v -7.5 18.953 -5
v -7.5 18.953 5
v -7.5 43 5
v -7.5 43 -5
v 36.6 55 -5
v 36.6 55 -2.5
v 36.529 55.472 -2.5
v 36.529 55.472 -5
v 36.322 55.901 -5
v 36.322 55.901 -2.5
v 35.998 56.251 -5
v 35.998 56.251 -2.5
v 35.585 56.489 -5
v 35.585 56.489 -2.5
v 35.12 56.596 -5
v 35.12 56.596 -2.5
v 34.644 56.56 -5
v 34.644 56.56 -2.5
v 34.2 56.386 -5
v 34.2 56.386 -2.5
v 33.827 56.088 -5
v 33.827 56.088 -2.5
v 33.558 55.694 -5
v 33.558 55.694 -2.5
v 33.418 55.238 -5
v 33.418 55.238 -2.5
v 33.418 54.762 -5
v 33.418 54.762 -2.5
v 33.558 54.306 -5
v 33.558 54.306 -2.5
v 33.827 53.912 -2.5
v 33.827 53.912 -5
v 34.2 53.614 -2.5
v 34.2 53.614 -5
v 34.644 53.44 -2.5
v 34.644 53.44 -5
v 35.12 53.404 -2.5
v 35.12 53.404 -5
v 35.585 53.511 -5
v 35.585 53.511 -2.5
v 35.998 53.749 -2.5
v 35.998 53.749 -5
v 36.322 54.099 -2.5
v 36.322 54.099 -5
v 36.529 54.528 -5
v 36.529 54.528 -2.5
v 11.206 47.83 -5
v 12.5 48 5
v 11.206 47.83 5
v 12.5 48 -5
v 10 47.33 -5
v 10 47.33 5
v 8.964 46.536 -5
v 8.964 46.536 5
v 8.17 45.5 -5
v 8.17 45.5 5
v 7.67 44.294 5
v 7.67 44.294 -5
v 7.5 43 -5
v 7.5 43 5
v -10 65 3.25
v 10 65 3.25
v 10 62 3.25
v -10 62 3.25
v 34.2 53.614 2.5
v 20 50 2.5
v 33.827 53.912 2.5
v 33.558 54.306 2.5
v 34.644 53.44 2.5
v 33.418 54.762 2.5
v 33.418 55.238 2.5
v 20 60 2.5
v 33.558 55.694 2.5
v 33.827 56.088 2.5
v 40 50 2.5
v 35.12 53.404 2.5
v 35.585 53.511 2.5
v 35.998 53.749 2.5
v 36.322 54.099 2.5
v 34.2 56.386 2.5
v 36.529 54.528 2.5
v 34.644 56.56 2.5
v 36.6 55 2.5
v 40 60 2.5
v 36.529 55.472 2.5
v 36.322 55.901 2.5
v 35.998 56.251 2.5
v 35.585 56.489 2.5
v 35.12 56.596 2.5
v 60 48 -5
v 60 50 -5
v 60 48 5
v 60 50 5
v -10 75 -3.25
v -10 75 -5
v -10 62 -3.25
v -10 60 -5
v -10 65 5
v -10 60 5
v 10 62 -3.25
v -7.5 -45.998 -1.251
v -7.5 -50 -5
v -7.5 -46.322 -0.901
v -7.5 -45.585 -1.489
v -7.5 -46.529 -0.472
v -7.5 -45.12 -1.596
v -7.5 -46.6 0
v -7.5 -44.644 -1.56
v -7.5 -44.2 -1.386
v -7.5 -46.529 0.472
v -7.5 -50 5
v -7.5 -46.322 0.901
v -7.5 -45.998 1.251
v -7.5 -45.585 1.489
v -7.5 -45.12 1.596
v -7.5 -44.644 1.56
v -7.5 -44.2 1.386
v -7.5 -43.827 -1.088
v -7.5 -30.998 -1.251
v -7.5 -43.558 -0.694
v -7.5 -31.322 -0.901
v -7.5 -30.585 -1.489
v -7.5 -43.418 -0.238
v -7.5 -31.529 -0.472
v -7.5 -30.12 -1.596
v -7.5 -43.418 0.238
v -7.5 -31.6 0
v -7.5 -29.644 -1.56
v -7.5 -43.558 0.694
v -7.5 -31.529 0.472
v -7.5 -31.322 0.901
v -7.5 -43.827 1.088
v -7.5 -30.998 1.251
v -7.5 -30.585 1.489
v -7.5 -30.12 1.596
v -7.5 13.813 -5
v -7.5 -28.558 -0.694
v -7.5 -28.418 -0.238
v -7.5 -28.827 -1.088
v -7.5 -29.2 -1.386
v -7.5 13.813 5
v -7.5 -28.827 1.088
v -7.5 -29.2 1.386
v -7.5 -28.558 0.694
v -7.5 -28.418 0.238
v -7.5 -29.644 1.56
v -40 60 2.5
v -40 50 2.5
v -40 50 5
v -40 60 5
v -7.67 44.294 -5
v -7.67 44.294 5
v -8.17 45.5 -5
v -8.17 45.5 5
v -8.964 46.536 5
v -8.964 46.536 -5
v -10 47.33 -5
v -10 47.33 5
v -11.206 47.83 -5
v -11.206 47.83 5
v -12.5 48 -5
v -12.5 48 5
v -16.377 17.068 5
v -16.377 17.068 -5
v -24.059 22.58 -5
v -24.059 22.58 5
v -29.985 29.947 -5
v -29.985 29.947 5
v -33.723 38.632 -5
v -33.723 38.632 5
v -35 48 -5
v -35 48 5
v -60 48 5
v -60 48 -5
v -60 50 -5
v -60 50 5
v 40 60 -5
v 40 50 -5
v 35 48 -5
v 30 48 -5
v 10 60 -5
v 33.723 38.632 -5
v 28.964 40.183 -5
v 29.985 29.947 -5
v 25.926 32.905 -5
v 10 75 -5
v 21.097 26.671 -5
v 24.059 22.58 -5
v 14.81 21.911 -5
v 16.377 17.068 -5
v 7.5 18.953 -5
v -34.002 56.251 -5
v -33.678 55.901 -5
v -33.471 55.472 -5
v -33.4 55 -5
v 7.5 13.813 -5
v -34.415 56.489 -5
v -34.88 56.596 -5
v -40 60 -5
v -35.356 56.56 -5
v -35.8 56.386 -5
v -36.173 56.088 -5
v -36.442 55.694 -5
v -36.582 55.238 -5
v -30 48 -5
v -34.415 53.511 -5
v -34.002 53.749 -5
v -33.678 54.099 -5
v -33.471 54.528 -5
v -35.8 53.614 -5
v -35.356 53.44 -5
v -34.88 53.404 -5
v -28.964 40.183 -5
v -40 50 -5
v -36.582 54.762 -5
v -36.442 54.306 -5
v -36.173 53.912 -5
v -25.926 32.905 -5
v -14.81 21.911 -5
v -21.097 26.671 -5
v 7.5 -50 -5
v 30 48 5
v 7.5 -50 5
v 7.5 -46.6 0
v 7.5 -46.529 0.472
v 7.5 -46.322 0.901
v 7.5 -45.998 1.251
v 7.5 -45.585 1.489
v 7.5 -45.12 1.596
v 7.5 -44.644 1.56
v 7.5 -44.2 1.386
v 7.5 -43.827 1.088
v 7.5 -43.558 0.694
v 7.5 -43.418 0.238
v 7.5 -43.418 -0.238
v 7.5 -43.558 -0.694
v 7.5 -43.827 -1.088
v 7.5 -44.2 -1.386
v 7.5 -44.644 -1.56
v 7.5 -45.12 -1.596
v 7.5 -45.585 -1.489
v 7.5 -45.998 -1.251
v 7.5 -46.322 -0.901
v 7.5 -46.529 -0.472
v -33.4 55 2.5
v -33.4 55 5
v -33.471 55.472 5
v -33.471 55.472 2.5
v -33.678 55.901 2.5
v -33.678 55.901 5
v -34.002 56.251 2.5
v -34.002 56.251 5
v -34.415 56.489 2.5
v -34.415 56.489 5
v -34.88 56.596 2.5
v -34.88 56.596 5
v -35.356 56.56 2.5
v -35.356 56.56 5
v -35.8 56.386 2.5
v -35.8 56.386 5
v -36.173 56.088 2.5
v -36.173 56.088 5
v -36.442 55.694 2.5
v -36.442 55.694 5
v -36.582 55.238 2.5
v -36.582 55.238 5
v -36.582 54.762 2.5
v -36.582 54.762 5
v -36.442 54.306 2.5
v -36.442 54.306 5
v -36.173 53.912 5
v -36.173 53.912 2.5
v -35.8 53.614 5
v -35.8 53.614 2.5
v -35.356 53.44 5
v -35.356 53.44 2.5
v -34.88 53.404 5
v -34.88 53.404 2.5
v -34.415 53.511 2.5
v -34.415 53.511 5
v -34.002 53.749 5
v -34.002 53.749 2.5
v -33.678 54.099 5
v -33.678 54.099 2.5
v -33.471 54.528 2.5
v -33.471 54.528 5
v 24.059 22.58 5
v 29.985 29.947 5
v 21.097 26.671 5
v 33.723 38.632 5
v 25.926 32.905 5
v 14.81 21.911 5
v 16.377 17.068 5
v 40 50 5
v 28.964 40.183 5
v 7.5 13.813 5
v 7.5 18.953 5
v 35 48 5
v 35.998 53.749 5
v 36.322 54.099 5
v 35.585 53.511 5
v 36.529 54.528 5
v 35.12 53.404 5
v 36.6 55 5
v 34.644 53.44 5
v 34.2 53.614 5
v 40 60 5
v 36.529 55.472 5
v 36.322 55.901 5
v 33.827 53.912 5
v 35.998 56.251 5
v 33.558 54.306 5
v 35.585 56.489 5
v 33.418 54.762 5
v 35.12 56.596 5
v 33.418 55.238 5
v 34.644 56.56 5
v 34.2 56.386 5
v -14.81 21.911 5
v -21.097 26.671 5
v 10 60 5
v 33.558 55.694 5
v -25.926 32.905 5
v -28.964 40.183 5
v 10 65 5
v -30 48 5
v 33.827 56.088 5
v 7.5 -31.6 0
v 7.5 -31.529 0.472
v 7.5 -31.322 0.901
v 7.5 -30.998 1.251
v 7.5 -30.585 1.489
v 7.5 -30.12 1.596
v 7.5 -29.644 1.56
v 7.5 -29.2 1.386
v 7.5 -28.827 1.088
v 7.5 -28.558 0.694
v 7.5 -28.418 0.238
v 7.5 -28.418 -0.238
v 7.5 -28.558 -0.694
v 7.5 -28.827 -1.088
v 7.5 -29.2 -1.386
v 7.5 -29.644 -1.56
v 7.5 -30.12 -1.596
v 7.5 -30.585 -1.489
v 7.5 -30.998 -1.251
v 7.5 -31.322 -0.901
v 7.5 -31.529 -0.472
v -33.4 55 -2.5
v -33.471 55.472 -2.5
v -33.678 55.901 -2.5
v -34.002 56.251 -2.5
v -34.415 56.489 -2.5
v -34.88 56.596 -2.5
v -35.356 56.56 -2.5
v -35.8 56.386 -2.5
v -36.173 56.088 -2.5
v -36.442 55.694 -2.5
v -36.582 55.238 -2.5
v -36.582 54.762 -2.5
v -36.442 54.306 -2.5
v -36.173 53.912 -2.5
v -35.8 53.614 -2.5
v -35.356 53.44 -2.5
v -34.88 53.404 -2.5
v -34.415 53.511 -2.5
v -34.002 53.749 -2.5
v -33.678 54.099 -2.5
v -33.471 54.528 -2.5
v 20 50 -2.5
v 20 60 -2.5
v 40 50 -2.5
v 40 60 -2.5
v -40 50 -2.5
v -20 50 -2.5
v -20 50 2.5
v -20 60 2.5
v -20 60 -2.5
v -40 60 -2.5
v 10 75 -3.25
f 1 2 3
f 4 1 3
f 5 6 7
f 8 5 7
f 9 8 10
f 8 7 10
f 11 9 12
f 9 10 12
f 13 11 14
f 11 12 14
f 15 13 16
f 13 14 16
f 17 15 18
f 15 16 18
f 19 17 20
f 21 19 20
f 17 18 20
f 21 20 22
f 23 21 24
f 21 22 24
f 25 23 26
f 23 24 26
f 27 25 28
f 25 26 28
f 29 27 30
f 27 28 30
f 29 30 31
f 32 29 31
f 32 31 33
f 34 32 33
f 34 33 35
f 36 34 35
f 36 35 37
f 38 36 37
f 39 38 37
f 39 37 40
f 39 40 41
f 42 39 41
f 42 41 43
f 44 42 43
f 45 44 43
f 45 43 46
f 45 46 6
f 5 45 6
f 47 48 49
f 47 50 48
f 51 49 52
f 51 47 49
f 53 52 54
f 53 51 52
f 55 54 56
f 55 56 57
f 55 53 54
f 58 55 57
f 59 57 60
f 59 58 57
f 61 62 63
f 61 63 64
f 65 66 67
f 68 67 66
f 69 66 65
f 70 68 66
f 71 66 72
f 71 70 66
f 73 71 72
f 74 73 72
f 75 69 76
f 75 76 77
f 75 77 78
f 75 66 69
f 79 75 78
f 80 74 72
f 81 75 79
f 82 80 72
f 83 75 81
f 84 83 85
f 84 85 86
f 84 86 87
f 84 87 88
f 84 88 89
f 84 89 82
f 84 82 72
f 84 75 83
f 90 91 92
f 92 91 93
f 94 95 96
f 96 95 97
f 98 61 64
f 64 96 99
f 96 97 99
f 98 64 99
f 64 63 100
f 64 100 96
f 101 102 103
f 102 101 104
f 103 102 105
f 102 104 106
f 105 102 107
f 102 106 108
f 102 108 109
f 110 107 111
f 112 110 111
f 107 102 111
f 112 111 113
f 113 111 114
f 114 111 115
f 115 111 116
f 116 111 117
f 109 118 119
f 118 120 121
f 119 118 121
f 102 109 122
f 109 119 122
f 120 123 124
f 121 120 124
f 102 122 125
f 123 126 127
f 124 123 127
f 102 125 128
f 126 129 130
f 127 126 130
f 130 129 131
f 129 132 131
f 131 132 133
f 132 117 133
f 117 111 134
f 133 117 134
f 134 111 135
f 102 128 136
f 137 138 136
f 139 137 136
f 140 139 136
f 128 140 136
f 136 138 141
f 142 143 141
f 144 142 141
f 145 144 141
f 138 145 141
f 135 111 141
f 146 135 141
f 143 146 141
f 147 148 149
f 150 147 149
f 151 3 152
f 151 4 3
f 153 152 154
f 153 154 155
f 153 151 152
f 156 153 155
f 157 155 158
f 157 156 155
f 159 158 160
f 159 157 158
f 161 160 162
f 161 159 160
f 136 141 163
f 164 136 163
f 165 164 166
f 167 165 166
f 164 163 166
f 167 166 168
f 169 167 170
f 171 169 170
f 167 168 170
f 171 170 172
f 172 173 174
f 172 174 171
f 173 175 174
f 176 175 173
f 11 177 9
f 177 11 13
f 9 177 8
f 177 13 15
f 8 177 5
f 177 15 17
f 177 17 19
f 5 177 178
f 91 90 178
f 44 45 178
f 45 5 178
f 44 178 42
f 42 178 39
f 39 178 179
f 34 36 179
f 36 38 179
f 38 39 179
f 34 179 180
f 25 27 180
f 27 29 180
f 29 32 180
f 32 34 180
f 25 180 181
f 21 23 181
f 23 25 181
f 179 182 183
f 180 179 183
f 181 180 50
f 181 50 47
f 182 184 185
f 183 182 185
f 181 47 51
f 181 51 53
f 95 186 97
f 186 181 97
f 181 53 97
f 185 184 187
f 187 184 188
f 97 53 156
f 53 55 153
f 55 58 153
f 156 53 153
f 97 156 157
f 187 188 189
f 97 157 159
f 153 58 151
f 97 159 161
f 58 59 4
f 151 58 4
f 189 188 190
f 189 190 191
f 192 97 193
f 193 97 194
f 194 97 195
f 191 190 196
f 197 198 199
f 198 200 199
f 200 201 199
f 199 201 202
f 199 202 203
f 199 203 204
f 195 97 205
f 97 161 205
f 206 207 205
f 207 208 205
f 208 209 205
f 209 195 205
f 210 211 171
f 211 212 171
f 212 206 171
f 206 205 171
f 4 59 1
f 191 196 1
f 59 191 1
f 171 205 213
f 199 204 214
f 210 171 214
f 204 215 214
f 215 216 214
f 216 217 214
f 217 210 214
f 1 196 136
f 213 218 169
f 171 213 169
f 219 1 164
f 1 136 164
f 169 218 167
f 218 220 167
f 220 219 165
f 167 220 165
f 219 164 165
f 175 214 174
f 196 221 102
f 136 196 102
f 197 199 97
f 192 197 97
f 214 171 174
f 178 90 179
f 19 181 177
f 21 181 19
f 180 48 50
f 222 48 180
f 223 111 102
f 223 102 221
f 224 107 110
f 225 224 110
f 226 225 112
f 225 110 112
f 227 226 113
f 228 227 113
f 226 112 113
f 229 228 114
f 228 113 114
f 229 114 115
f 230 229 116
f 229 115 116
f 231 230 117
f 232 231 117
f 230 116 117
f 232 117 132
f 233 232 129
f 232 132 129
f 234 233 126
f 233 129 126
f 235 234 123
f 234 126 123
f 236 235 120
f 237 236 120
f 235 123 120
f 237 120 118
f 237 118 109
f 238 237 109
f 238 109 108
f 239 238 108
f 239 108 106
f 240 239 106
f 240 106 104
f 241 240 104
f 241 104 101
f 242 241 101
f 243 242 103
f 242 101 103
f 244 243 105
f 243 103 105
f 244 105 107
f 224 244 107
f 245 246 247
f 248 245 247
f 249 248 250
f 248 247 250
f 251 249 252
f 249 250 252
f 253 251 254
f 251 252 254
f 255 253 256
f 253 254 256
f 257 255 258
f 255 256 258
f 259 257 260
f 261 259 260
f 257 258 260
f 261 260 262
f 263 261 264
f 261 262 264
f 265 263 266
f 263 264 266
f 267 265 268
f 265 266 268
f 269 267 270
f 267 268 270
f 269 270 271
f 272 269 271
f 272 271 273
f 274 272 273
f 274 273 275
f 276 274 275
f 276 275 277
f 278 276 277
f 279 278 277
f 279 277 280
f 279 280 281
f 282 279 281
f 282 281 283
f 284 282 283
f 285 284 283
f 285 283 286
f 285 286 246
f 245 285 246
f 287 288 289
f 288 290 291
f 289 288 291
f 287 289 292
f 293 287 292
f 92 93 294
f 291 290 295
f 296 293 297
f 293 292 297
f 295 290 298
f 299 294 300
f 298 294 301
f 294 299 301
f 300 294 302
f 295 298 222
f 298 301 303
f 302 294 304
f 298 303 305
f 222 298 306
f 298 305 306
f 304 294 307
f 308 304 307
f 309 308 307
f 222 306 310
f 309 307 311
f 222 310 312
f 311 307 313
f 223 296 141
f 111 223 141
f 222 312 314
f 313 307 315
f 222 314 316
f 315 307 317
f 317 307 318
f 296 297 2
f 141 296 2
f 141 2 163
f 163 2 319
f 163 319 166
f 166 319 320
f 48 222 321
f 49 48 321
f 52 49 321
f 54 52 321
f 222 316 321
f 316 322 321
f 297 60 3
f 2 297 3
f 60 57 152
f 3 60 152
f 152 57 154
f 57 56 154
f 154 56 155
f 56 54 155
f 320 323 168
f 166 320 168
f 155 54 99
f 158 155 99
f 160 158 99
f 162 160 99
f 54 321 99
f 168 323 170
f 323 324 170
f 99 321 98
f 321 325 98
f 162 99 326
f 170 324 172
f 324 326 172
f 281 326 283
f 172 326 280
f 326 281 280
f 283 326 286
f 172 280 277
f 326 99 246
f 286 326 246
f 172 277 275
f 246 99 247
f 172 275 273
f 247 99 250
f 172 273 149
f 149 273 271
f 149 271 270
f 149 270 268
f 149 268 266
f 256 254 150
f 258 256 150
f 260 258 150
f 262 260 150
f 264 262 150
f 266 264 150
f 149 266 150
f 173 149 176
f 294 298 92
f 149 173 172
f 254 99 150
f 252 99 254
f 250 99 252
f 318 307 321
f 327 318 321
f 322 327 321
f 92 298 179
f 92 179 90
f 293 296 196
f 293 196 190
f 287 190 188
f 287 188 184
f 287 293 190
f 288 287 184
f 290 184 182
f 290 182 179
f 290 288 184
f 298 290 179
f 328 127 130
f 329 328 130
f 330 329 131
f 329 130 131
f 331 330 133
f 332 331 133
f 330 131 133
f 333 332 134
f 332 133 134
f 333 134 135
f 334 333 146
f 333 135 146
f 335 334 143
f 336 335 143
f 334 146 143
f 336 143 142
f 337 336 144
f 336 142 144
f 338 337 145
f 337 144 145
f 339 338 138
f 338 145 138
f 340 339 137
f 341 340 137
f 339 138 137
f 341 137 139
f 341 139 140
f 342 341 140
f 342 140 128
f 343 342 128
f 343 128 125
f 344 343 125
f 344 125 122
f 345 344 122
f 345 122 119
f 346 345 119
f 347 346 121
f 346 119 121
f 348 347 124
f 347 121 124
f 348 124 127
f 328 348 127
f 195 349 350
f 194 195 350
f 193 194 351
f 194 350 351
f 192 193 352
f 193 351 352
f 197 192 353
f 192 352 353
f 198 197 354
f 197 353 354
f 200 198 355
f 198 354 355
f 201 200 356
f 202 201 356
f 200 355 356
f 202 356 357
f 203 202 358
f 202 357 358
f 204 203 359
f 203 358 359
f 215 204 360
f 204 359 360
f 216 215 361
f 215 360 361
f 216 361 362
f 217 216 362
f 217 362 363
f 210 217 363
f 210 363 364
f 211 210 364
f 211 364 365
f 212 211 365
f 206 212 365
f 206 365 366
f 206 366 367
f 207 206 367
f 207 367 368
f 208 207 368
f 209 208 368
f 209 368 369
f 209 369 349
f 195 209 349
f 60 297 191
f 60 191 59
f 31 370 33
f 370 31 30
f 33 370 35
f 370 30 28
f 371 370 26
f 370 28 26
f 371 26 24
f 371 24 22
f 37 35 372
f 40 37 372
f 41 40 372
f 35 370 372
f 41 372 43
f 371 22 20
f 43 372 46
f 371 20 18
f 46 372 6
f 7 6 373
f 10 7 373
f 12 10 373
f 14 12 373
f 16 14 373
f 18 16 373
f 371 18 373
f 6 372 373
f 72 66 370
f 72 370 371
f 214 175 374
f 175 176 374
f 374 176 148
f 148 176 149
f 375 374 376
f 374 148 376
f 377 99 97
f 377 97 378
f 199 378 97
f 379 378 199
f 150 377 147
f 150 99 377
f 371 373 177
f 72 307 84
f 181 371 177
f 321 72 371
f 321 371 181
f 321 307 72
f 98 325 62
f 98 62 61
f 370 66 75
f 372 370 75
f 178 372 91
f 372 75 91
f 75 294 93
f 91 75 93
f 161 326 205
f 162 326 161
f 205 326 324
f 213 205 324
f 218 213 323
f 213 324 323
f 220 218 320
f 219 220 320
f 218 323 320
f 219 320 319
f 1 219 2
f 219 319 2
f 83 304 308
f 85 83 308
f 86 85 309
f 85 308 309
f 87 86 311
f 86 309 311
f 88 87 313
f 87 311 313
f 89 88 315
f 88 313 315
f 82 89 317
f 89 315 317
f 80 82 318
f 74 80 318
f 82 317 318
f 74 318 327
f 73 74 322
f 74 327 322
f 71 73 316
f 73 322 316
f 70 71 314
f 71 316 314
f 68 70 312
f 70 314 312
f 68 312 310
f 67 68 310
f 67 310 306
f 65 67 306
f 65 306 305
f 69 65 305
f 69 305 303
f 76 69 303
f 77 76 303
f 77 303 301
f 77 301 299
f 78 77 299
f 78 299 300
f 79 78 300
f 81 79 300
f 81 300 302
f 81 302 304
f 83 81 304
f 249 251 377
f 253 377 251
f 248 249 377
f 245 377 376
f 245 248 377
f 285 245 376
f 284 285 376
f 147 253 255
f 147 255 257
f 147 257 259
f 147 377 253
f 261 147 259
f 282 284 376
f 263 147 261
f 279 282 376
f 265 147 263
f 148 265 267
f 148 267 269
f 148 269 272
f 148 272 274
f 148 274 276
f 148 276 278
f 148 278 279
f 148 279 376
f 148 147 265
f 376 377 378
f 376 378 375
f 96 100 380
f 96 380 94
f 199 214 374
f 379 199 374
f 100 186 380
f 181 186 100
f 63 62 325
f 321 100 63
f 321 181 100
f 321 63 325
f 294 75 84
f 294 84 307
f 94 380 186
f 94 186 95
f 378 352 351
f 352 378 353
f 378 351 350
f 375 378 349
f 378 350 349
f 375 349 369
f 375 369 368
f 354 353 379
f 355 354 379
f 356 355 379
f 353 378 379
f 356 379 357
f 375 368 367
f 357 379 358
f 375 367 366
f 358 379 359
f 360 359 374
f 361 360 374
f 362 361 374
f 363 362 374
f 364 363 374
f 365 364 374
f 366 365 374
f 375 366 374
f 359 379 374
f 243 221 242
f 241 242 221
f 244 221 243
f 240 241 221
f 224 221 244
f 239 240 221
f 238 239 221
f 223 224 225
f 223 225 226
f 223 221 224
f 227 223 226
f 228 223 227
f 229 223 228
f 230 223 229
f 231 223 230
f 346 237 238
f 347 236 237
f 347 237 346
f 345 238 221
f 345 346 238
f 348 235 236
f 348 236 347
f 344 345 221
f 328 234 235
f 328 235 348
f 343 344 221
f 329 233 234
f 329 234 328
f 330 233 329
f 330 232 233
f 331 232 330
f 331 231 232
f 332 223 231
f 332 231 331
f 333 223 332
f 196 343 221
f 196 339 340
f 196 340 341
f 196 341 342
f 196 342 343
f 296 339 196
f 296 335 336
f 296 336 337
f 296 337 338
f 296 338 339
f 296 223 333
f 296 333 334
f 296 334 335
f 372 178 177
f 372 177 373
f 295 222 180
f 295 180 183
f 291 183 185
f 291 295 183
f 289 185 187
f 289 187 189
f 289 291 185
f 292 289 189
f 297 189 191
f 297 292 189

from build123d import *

# Parameters (mm, degrees)
F0_W      = 15
F0_H      = 100
F1_DEPTH  = 5
F2_W      = 80
F2_H      = 10
F3_DEPTH  = 10
F4_W      = 10
F4_H      = 5
F5_DEPTH  = 20
F6_W      = 10
F6_H      = 5
F7_DEPTH  = 20
F8_R      = 1.6
F9_DEPTH  = 10
F10_W     = 67.5
F10_H     = 10
F10_W_2   = 120
F11_DEPTH = 2
F12_R     = 5
F13_R     = 1.6
F14_DEPTH = 15
F15_W     = 20
F15_H     = 10
F16_DEPTH = 5
F17_W     = 20
F17_H     = 6.5
F18_DEPTH = 3
F19_DEPTH = 10
F21_DEPTH = 10


# Not quite as in the source:
# - a pattern or mirror of a feature is missing from the dataset's text; its kind, count and spacing are read off the source's solid


with BuildPart() as f1:
    # F0 (on Top) → F1 (new body, symmetric)
    with BuildSketch(Plane.XY):
        Rectangle(F0_W, F0_H)
    extrude(amount=F1_DEPTH, both=True)

    # F2 (on face) → F3 (join)
    with BuildSketch(Plane(origin=(0, 50, 0), x_dir=(-1, 0, 0), z_dir=(0, 1, 0))):
        Rectangle(F2_W, F2_H)
    extrude(amount=F3_DEPTH)

    # F4 (on face) → F5 (cut)
    with BuildSketch(Plane(origin=(-40, 0, 0), x_dir=(0, -1, 0), z_dir=(-1, 0, 0))):
        with Locations((-55, 0)):
            Rectangle(F4_W, F4_H)
    extrude(amount=-F5_DEPTH, mode=Mode.SUBTRACT)

    # F6 (on face) → F7 (cut)
    with BuildSketch(Plane.YZ.offset(40)):
        with Locations((55, 0)):
            Rectangle(F6_W, F6_H)
    extrude(amount=-F7_DEPTH, mode=Mode.SUBTRACT)

    # F8 (on face) → F9 (cut, through all)
    with BuildSketch(Plane.XY.offset(5)):
        with Locations((-35, 55)):
            Circle(F8_R)
        with Locations((35, 55)):
            Circle(F8_R)
    extrude(amount=-F9_DEPTH, mode=Mode.SUBTRACT)

    # F10 (on face) → F11 (join)
    with BuildSketch(Plane.XZ.offset(-50)):
        with Locations((26.25, 0)):
            Rectangle(F10_W, F10_H)
        Rectangle(F10_W_2, F10_H)
    extrude(amount=F11_DEPTH)

    # F12
    f12_edges = [f1.edges().sort_by_distance(p)[0] for p in [
        (-7.5, 48, 0),
        (7.5, 48, 0),
    ]]
    fillet(f12_edges, radius=F12_R)

    # F13 (on face) → F14 (cut, through all)
    with BuildSketch(Plane(origin=(-7.5, 0, 0), x_dir=(0, -1, 0), z_dir=(-1, 0, 0))):
        with Locations((30, 0)):
            Circle(F13_R)
        with Locations((45, 0)):
            Circle(F13_R)
    extrude(amount=-F14_DEPTH, mode=Mode.SUBTRACT)

    # F15 (on face) → F16 (join)
    with BuildSketch(Plane(origin=(0, 60, 0), x_dir=(-1, 0, 0), z_dir=(0, 1, 0))):
        Rectangle(F15_W, F15_H)
    extrude(amount=F16_DEPTH)

    # F17 (on face) → F18 (cut)
    with BuildSketch(Plane(origin=(0, 65, 0), x_dir=(-1, 0, 0), z_dir=(0, 1, 0))):
        Rectangle(F17_W, F17_H)
    extrude(amount=-F18_DEPTH, mode=Mode.SUBTRACT)

    # F19 (add): a face of the model
    f19_faces = [f1.faces().sort_by_distance(p)[0] for p in [
        (0, 65, -4.125),
    ]]
    extrude(f19_faces, amount=F19_DEPTH)

    # F20 (on face) → F21 (join, through all)
    with BuildSketch(Plane.XY.offset(5)):
        with BuildLine():
            Line((35, 48), (30, 48))
            ThreePointArc((30, 48), (23.7170824513, 29.6288269291), (7.5, 18.9526249034))
            Line((7.5, 18.9526249034), (7.5, 13.8130141721))
            ThreePointArc((7.5, 13.8130141721), (27.2717802866, 26.0625890315), (35, 48))
        make_face()
    f21 = extrude(amount=-F21_DEPTH)

    # F21_copies: F21 across plane
    add(f21.mirror(Plane(origin=(0, 0, 0), x_dir=(0, 0, -1), z_dir=(-1, 0, 0))))


solid = f1.part
